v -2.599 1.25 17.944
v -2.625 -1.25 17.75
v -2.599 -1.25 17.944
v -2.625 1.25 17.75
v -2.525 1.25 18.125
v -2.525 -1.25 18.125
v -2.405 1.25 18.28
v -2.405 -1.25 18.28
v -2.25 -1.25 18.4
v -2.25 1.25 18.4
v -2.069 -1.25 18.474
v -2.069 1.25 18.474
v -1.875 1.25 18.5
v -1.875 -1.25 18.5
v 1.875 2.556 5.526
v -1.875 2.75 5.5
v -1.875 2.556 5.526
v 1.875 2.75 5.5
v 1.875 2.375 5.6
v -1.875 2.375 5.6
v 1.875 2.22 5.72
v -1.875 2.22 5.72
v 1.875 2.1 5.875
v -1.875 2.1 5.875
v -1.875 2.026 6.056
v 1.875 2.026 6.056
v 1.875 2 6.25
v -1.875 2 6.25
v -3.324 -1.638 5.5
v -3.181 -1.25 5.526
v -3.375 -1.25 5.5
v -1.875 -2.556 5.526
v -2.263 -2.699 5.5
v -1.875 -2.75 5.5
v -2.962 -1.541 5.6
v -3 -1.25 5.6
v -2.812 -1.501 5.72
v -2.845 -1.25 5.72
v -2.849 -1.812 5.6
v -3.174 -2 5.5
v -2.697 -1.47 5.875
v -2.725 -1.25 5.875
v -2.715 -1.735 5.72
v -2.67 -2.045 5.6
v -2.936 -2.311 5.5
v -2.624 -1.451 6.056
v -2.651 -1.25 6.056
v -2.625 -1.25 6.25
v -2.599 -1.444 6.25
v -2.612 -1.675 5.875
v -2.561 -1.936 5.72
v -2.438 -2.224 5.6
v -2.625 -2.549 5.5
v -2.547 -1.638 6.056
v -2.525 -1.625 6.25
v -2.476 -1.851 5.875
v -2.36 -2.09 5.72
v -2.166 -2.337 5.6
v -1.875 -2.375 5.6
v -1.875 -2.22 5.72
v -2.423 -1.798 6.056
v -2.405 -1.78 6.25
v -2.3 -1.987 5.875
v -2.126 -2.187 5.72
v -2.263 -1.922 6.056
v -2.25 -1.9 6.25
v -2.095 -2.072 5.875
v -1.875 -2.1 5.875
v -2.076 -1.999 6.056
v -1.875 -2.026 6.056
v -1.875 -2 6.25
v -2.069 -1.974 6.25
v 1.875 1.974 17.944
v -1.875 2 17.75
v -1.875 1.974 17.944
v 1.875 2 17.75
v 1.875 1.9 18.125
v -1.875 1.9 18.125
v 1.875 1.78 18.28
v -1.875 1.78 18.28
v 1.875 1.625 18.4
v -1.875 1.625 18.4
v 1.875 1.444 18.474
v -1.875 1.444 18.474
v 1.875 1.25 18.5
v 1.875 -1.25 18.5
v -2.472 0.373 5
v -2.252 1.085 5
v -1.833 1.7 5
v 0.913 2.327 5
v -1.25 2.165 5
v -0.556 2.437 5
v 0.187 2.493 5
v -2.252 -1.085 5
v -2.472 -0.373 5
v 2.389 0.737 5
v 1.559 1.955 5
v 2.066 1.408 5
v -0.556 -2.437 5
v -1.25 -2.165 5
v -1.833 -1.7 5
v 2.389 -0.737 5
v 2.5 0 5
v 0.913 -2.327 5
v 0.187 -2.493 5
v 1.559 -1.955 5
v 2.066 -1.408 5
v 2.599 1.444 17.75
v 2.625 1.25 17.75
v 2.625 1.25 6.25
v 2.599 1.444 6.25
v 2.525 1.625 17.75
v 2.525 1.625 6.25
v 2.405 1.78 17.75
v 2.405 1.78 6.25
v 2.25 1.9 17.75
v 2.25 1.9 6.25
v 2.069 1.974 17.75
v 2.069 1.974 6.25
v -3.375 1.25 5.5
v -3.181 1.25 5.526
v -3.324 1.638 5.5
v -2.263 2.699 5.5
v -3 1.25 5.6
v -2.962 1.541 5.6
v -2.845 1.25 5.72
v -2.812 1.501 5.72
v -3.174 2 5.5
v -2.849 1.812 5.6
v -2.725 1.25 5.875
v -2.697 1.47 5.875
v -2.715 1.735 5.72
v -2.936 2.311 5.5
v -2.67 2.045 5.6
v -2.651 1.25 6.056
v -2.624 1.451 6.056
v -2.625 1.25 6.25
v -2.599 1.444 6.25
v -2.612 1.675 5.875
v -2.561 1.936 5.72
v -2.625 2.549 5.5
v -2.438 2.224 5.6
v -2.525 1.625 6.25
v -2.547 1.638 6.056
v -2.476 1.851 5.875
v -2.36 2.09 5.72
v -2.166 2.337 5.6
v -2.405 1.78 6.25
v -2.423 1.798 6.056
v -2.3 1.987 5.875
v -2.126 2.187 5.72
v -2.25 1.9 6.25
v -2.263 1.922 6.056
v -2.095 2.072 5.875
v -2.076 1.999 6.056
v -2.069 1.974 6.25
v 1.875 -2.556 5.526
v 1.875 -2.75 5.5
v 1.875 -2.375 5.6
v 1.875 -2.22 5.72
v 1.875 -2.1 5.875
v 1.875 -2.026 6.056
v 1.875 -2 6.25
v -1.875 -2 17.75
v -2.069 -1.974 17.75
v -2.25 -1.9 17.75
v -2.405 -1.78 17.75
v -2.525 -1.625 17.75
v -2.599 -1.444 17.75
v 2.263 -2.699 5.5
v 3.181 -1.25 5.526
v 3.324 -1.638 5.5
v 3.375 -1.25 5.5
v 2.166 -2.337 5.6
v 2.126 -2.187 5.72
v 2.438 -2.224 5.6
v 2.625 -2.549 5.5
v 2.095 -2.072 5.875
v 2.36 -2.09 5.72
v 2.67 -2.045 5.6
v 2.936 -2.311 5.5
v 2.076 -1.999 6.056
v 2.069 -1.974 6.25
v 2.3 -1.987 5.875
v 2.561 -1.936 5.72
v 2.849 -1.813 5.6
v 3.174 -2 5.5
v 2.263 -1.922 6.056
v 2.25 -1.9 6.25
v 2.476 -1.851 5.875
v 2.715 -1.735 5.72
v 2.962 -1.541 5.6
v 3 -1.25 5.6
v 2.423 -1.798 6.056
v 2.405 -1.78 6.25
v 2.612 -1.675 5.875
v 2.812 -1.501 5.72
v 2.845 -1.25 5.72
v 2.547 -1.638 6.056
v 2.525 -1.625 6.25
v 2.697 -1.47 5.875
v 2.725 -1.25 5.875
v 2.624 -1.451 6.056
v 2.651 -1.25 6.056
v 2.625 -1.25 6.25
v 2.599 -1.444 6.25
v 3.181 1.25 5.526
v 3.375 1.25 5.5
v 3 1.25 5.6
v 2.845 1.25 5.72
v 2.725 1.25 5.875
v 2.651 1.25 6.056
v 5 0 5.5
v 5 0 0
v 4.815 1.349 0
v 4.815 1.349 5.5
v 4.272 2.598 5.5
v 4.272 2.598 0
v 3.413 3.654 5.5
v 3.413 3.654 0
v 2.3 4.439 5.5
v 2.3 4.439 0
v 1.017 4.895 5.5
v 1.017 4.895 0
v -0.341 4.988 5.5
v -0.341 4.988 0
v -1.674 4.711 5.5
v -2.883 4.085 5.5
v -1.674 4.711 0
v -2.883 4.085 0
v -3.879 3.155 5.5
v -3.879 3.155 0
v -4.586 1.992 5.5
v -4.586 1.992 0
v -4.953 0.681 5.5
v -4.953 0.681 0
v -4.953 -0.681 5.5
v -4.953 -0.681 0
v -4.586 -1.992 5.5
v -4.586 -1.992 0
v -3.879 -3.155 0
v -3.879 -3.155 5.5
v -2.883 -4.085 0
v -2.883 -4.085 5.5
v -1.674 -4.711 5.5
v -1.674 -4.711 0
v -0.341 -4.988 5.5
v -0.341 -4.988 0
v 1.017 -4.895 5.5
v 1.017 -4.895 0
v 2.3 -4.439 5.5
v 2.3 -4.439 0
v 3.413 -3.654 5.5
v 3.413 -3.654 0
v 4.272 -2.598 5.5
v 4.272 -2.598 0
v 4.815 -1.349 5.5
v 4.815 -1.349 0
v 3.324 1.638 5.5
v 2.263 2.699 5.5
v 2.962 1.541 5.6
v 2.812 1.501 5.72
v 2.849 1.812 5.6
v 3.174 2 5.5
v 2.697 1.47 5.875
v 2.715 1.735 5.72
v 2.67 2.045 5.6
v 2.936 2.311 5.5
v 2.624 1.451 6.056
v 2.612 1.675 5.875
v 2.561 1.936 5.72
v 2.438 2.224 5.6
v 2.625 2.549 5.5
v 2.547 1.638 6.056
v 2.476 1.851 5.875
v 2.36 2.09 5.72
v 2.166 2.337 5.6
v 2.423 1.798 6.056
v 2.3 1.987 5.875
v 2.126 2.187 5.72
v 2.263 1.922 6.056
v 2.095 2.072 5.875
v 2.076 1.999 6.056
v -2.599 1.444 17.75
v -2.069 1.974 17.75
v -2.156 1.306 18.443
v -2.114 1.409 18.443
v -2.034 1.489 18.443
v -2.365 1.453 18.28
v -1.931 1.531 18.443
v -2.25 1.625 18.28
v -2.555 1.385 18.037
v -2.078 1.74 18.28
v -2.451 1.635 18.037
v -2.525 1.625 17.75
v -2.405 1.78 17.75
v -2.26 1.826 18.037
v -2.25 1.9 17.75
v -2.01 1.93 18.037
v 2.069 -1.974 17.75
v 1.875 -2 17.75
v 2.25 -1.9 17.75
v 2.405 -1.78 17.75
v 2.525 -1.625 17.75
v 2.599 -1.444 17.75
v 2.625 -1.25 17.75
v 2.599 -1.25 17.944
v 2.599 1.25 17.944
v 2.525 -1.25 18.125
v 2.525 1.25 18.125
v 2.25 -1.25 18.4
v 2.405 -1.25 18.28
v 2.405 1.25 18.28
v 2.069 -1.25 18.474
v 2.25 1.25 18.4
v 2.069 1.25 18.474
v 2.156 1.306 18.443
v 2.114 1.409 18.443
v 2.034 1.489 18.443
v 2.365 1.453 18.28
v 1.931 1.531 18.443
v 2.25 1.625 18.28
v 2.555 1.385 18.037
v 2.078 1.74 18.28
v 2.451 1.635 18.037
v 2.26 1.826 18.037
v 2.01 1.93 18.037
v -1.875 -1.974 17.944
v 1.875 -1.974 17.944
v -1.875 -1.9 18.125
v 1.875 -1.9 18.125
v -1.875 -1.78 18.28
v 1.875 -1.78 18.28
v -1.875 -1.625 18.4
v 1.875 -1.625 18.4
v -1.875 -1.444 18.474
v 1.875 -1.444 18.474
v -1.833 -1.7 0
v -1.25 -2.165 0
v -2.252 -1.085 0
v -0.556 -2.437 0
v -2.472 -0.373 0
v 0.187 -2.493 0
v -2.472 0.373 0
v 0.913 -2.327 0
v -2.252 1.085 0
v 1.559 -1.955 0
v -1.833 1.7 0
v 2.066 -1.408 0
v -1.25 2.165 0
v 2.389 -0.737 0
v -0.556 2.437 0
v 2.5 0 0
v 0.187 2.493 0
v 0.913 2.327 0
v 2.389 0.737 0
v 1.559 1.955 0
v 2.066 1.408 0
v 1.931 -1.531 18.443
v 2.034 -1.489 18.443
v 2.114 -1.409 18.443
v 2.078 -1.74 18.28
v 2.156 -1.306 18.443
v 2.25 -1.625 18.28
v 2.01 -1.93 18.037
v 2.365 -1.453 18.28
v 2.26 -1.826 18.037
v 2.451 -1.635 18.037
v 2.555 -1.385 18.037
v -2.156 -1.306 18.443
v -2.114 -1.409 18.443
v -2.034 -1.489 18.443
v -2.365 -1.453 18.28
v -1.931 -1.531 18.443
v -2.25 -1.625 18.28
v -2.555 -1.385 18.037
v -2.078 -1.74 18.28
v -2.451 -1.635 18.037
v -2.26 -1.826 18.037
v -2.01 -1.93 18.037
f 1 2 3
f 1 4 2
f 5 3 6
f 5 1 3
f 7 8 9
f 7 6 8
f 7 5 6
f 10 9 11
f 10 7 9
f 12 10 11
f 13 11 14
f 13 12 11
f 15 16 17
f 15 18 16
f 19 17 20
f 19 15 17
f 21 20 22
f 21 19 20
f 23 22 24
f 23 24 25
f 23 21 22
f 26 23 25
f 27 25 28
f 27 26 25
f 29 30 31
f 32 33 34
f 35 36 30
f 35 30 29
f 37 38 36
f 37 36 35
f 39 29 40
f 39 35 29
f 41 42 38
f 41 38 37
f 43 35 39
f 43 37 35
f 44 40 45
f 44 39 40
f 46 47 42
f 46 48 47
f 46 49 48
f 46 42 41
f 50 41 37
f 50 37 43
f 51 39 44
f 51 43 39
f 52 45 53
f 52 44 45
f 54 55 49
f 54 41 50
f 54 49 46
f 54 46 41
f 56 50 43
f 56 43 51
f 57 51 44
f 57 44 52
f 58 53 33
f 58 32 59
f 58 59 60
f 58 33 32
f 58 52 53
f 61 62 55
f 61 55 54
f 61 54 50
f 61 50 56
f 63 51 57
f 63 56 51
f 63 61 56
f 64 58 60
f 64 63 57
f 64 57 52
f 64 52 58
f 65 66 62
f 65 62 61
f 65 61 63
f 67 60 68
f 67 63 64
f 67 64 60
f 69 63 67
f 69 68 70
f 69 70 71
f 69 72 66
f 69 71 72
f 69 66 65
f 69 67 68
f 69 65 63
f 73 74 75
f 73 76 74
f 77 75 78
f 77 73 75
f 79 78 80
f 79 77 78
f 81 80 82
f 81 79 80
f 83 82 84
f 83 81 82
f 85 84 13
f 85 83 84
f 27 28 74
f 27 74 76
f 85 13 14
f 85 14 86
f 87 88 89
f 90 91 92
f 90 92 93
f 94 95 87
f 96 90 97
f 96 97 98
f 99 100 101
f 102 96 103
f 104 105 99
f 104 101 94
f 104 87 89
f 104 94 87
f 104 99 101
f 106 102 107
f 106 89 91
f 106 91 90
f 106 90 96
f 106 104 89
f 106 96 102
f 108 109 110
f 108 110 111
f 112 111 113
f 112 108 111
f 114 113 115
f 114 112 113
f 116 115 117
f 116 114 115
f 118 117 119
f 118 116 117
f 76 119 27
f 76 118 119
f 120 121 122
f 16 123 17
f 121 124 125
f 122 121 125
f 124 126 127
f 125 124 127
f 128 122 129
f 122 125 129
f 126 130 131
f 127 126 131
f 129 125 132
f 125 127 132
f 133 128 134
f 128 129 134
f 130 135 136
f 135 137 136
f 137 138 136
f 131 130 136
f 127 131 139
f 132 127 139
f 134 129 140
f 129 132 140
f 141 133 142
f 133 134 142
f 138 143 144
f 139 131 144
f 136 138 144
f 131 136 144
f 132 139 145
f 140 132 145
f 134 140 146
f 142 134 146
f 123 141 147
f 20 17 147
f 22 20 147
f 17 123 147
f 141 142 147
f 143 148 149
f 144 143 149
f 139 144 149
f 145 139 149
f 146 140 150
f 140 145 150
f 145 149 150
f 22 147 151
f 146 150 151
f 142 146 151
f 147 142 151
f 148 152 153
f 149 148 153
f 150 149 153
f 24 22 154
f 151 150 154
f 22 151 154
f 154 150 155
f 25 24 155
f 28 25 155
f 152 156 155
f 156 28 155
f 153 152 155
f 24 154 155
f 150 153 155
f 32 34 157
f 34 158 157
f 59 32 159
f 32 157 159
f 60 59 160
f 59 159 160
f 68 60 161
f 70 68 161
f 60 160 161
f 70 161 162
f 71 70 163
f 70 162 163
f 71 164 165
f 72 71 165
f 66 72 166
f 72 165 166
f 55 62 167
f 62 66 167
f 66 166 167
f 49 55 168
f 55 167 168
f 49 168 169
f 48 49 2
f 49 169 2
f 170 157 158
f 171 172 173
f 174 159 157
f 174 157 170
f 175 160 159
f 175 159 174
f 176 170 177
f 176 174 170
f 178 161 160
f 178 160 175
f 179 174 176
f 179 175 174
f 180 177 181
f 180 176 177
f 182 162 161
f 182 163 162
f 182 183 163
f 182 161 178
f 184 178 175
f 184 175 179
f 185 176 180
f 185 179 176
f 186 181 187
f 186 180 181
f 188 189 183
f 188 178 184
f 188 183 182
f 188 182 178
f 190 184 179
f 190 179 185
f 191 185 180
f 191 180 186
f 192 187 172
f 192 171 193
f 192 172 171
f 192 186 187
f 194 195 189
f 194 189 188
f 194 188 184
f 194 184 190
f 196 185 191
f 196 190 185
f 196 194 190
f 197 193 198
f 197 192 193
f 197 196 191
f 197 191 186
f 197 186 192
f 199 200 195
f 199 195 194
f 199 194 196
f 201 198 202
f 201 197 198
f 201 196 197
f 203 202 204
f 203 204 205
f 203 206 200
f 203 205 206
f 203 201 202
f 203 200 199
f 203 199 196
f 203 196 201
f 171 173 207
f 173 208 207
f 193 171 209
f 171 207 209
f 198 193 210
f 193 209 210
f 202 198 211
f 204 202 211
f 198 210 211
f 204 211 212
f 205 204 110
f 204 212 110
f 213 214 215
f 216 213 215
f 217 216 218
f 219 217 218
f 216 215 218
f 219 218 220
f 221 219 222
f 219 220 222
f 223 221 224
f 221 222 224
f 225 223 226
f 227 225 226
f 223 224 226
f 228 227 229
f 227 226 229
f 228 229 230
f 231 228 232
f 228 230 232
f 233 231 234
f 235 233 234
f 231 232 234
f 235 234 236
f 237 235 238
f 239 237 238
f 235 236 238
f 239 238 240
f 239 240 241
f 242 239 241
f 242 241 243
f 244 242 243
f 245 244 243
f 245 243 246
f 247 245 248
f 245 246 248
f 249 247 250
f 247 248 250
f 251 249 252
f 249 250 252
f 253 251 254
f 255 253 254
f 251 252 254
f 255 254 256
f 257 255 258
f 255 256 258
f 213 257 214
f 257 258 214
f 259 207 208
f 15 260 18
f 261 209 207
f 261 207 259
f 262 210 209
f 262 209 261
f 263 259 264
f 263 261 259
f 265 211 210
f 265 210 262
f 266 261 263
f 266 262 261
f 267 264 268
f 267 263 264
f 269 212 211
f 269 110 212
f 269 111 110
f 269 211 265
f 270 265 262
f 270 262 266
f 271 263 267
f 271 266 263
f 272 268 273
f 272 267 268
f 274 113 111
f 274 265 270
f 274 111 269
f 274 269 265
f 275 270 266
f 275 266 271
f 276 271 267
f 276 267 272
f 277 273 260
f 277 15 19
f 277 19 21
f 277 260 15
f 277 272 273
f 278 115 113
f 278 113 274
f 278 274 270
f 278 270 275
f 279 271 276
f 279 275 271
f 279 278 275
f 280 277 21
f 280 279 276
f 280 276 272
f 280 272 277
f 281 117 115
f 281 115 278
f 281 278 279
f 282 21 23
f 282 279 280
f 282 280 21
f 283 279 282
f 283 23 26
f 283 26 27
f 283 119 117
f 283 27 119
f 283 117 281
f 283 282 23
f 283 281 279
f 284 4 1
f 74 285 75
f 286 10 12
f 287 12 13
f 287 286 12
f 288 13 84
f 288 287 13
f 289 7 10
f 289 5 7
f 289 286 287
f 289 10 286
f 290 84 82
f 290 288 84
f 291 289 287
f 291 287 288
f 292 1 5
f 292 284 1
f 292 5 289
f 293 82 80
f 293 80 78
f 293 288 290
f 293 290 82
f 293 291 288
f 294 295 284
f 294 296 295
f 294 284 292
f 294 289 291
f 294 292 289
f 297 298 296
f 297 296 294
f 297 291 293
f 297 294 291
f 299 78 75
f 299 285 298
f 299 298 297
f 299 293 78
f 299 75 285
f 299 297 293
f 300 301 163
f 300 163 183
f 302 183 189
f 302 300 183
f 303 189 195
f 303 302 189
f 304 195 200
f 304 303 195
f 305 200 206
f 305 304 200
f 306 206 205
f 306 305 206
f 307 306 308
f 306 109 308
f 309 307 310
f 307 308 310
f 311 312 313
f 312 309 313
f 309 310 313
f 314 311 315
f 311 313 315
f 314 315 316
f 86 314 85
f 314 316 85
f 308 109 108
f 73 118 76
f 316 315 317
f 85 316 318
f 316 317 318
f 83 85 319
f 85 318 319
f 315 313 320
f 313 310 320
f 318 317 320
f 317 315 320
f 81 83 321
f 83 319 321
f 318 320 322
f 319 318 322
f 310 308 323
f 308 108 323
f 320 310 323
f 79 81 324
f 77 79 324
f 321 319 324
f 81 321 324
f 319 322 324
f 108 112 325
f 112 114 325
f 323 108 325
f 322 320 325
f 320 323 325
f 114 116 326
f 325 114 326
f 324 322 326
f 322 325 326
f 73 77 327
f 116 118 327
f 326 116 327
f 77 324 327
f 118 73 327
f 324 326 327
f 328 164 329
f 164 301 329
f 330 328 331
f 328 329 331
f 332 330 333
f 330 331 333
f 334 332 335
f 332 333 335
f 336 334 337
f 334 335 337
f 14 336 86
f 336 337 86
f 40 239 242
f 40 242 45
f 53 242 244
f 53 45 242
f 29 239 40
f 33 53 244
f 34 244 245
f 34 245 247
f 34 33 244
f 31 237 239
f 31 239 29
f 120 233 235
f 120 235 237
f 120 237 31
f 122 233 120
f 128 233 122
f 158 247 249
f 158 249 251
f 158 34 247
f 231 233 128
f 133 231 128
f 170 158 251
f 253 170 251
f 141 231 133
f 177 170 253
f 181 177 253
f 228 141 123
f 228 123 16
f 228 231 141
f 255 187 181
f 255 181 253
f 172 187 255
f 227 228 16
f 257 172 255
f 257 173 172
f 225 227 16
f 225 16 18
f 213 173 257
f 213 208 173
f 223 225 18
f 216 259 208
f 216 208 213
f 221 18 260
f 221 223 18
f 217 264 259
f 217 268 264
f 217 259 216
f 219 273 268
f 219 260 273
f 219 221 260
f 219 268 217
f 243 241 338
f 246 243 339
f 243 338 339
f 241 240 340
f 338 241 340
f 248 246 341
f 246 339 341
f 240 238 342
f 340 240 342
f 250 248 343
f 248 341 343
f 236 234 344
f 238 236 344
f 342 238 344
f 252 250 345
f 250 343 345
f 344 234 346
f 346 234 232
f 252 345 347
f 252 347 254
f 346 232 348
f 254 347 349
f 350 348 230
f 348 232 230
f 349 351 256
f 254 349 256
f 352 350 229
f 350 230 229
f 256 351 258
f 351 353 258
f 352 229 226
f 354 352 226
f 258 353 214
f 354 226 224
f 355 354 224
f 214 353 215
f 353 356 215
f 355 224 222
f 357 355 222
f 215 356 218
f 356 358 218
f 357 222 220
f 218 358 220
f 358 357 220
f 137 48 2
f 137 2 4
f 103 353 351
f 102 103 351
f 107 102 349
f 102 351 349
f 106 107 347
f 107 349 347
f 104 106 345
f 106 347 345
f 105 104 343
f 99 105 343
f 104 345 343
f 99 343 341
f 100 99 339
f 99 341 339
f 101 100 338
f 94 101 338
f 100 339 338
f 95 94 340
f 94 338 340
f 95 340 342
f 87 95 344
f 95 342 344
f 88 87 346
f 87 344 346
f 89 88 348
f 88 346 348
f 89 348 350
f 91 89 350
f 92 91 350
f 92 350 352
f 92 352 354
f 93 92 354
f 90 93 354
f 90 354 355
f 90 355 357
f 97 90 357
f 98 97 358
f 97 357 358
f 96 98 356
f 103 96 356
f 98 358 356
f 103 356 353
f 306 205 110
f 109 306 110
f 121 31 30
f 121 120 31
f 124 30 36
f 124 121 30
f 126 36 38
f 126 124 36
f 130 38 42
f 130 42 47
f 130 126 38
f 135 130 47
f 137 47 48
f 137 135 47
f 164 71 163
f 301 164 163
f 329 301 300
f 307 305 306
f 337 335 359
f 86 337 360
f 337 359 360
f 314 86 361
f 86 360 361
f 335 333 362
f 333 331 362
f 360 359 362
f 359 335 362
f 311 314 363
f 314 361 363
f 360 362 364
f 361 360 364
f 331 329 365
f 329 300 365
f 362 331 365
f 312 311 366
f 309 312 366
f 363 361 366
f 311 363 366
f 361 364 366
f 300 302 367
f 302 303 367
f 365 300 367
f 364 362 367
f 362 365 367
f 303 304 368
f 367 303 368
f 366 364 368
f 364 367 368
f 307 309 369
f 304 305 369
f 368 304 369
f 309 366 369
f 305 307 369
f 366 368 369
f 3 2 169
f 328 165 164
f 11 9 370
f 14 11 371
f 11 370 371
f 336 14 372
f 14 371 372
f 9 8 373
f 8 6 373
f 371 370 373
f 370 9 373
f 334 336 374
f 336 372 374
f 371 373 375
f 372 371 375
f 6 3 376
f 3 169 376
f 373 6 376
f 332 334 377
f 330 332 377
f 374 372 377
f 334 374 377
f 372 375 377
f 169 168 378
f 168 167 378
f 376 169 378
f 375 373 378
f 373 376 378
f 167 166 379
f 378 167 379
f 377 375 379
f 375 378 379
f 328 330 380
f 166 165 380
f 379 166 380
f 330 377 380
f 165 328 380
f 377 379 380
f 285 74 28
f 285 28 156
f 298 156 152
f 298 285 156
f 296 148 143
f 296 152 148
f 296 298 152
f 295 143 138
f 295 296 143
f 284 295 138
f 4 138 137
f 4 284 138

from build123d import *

# Parameters (mm, degrees)
F0_R     = 5
F1_DEPTH = 5.5
F2_W     = 5.25
F2_H     = 4
F3_DEPTH = 13
F4_R     = 0.75
F5_R     = 2.5
F6_DEPTH = 5


with BuildPart() as f1:
    # F0 (on Top) → F1 (new body)
    with BuildSketch(Plane.XY):
        Circle(F0_R)
    extrude(amount=F1_DEPTH)

    # F2 (on face) → F3 (join)
    with BuildSketch(Plane.XY.offset(5.5)):
        Rectangle(F2_W, F2_H)
    extrude(amount=F3_DEPTH)

    # F4
    f4_edges = [f1.edges().sort_by_distance(p)[0] for p in [
        (-2.625, -2, 12),
        (2.625, -2, 12),
        (2.625, 2, 12),
        (-2.625, 2, 12),
        (-2.625, 0, 5.5),
        (-2.625, 0, 18.5),
        (0, -2, 18.5),
        (2.625, 0, 18.5),
        (0, 2, 18.5),
        (0, -2, 5.5),
        (2.625, 0, 5.5),
        (0, 2, 5.5),
    ]]
    fillet(f4_edges, radius=F4_R)

    # F5 (on face) → F6 (cut)
    with BuildSketch(Plane(origin=(0, 0, 0), x_dir=(1, 0, 0), z_dir=(0, 0, -1))):
        Circle(F5_R)
    extrude(amount=-F6_DEPTH, mode=Mode.SUBTRACT)


solid = f1.part
